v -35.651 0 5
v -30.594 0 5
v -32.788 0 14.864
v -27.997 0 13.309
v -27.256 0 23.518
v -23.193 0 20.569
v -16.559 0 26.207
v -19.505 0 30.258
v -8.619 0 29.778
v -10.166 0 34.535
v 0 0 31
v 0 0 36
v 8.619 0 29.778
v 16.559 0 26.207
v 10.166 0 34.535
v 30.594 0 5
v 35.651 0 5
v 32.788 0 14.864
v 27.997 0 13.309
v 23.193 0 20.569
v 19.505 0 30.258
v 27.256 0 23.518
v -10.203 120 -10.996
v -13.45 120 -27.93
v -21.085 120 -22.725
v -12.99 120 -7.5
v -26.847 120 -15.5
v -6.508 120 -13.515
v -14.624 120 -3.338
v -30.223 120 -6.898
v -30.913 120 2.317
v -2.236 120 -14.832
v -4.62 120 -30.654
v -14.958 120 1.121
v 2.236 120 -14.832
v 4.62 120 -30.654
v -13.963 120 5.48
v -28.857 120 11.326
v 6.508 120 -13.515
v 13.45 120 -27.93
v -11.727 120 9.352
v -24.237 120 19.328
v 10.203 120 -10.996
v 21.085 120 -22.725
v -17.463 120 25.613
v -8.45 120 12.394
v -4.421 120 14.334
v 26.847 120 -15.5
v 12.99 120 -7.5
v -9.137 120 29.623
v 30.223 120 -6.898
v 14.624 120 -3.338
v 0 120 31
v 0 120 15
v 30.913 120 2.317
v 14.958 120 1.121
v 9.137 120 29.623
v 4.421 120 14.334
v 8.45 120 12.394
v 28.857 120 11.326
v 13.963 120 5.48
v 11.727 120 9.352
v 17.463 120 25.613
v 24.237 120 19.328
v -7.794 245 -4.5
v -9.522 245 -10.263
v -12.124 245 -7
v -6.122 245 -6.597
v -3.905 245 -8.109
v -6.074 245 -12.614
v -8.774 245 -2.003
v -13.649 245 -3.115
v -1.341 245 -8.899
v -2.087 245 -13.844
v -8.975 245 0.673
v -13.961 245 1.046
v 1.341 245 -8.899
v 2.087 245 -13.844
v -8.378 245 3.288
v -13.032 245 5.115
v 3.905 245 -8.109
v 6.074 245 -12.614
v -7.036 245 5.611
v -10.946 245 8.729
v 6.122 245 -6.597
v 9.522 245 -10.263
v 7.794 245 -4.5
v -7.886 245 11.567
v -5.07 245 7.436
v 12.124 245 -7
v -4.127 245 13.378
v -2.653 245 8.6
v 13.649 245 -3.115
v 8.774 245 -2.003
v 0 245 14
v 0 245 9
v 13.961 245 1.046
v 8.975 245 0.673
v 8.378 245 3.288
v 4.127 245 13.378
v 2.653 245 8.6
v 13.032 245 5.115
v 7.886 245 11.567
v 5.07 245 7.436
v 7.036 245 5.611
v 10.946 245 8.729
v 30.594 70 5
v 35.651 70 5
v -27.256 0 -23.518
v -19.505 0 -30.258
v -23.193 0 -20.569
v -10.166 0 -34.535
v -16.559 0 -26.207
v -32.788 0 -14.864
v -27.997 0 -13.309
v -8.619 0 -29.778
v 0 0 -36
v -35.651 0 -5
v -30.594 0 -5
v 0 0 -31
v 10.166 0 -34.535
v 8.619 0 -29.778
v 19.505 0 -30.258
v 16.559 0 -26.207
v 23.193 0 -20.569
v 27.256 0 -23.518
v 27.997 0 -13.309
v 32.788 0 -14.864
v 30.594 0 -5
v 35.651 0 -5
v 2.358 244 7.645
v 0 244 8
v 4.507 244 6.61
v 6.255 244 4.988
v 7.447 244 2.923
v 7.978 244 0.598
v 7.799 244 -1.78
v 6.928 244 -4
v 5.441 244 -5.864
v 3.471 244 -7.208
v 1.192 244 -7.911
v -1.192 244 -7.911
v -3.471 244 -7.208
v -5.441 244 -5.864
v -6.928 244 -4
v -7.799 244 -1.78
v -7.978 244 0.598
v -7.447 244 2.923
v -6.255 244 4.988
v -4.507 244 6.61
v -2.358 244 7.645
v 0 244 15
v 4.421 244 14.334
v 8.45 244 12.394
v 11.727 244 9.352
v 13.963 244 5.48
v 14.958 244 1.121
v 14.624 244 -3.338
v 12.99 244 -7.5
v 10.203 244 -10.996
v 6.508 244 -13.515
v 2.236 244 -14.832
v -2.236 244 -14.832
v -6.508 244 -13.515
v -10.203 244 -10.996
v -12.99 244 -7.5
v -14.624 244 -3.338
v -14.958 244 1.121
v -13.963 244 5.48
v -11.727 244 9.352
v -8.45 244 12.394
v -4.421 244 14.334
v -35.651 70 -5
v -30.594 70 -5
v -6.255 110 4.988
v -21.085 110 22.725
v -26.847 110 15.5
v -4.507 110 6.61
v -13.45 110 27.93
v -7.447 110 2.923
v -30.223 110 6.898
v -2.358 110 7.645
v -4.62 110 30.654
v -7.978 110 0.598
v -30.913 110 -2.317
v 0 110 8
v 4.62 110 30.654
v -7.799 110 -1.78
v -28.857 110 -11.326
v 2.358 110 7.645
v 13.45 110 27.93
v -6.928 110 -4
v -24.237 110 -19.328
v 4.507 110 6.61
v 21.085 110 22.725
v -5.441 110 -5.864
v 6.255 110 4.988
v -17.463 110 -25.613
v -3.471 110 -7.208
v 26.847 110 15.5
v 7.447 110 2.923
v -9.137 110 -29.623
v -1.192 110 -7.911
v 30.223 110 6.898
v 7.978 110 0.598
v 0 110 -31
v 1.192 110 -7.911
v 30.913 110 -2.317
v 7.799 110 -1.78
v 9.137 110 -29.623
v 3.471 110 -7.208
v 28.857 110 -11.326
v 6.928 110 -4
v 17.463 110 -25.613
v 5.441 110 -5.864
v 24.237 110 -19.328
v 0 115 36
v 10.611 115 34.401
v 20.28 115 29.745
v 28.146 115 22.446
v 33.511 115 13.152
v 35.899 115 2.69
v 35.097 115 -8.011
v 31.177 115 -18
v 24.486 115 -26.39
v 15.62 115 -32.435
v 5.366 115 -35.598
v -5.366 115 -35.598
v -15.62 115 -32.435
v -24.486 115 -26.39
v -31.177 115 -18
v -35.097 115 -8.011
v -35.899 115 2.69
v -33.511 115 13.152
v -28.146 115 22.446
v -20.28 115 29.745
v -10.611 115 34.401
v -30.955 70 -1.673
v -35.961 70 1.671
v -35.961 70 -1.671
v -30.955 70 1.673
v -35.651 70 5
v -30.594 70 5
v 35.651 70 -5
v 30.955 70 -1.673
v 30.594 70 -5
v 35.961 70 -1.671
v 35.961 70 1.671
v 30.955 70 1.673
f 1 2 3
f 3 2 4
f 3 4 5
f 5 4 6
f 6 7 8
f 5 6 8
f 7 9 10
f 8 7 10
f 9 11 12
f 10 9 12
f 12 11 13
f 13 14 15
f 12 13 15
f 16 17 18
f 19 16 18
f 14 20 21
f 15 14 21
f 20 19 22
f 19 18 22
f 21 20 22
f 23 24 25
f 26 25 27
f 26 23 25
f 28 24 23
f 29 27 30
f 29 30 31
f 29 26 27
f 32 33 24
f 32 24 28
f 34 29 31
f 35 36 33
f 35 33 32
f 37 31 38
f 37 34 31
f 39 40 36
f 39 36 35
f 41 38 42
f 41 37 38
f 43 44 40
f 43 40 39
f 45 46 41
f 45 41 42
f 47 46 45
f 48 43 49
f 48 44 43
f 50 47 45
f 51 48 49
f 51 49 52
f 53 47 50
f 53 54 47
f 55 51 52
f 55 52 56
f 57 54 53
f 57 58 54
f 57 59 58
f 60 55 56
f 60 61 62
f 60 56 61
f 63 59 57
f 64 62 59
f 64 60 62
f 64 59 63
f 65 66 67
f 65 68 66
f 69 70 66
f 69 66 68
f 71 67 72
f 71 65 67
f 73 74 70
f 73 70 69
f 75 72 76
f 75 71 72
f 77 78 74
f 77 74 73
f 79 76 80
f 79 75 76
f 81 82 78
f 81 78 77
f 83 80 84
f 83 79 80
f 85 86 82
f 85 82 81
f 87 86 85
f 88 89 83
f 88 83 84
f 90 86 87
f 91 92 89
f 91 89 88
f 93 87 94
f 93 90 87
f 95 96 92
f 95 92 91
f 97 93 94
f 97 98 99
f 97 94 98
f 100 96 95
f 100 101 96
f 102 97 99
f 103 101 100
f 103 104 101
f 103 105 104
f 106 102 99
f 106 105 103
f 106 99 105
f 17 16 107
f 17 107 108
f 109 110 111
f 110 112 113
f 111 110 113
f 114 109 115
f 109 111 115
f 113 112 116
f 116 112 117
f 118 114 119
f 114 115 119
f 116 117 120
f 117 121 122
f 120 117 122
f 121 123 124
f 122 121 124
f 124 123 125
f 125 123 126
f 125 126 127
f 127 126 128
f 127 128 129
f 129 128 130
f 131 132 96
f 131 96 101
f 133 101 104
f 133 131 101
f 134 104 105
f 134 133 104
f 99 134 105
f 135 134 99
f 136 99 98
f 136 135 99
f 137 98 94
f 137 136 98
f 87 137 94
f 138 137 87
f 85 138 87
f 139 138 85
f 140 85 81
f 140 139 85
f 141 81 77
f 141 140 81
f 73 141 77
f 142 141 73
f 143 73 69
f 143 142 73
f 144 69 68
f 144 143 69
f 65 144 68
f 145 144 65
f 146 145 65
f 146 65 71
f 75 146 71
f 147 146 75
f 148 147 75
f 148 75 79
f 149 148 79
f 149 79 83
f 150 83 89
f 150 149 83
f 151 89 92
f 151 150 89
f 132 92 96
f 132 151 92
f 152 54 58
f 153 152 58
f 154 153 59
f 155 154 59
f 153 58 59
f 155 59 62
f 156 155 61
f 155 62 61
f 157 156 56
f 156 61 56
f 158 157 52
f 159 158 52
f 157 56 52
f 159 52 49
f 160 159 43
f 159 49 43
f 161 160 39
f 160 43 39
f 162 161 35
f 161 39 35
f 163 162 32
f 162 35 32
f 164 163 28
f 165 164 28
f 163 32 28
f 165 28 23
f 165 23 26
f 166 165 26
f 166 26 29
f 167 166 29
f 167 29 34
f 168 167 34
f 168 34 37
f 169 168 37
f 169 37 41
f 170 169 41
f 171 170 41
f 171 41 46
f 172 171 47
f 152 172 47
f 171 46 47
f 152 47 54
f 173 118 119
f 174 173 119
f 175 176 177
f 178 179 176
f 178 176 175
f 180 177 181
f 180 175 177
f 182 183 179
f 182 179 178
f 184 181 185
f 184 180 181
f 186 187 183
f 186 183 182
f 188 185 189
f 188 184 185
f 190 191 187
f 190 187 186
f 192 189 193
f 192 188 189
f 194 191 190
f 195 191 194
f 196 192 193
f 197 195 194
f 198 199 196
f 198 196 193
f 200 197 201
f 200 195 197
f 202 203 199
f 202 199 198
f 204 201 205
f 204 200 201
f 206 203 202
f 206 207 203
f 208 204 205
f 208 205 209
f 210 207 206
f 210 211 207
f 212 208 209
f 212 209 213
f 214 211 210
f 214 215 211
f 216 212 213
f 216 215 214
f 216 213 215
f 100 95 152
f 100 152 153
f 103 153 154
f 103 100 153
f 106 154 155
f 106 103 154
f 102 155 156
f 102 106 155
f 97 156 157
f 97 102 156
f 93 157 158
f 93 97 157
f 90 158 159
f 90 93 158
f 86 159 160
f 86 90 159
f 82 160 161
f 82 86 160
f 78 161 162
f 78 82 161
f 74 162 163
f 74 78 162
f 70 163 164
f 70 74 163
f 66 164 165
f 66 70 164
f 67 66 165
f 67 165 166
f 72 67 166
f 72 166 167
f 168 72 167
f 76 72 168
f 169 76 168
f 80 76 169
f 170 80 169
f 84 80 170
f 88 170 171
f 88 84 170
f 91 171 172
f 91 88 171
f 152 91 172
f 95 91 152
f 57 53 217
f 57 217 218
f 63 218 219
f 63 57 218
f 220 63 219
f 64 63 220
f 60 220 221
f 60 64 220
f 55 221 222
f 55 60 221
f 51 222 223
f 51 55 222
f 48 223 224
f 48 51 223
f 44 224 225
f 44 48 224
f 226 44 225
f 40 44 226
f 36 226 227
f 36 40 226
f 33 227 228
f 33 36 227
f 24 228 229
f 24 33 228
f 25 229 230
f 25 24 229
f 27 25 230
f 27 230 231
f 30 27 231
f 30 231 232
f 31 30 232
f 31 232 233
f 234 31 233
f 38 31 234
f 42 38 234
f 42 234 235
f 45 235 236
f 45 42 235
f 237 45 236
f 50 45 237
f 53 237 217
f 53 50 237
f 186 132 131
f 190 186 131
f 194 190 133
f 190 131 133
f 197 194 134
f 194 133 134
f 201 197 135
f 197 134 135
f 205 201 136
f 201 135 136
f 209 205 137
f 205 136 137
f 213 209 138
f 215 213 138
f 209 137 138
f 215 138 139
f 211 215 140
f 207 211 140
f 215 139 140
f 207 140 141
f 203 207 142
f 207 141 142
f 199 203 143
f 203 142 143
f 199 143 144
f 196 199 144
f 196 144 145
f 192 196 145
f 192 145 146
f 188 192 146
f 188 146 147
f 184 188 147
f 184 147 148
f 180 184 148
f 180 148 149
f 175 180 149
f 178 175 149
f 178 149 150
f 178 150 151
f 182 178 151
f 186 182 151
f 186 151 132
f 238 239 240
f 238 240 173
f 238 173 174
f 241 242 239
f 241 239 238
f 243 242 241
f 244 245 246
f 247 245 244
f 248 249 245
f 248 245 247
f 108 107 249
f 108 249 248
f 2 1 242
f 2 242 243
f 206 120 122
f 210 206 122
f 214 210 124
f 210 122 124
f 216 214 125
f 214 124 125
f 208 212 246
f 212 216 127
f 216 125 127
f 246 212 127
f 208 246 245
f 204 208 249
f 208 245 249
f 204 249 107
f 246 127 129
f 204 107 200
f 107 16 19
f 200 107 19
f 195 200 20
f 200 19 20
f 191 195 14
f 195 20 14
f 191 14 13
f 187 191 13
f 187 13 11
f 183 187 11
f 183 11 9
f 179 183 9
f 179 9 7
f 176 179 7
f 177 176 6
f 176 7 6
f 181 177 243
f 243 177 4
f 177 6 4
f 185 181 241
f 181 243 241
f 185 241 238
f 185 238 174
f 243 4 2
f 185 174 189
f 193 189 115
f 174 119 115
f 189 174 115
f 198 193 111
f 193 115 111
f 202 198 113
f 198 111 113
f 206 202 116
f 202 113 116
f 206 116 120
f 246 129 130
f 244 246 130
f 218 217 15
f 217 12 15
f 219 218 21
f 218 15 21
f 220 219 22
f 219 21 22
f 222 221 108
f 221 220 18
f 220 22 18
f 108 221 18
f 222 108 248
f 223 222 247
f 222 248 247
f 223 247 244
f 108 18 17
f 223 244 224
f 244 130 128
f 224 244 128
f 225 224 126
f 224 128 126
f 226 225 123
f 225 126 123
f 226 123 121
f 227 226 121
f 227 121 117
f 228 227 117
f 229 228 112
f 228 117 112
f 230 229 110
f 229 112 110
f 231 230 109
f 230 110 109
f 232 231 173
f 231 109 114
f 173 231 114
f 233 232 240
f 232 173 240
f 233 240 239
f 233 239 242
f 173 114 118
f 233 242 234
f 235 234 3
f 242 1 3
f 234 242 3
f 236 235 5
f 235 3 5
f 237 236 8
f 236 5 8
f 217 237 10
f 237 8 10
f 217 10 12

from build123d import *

# Parameters (mm, degrees)
SCHIZZO1_R        = 36
ESTRUSIONE1_DEPTH = 120
SCHIZZO2_R        = 31
ESTRUSIONE2_DEPTH = 110
SMUSSO1_SIZE      = 5
SCHIZZO3_R        = 15
ESTRUSIONE3_DEPTH = 125
SCHIZZO4_R        = 8
ESTRUSIONE4_DEPTH = 251.23389059
SMUSSO2_SIZE      = 1
SCHIZZO5_W        = 88.337421072
SCHIZZO5_H        = 10
ESTRUSIONE5_DEPTH = 70


with BuildPart() as part:
    # Schizzo1 → Estrusione1 (new body)
    with BuildSketch(Plane(origin=(0, 0, 0), x_dir=(1, 0, 0), z_dir=(0, 1, 0))):
        with Locations(Location((0, 0, 0), (0, 0, 270))):
            Circle(SCHIZZO1_R)
    extrude(amount=ESTRUSIONE1_DEPTH)

    # Schizzo2 → Estrusione2 (cut)
    with BuildSketch(Plane.XZ):
        with Locations(Location((0, 0, 0), (0, 0, 270))):
            Circle(SCHIZZO2_R)
    extrude(amount=-ESTRUSIONE2_DEPTH, mode=Mode.SUBTRACT)

    # Smusso1
    smusso1_edges = [part.edges().sort_by_distance(p)[0] for p in [
        (0, 120, -36),
    ]]
    chamfer(smusso1_edges, length=SMUSSO1_SIZE)

    # Schizzo3 → Estrusione3 (add)
    with BuildSketch(Plane(origin=(0, 120, 0), x_dir=(1, 0, 0), z_dir=(0, 1, 0))):
        with Locations(Location((0, 0, 0), (0, 0, 270))):
            Circle(SCHIZZO3_R)
    extrude(amount=ESTRUSIONE3_DEPTH)

    # Schizzo4 → Estrusione4 (cut, through all)
    with BuildSketch(Plane(origin=(0, 245, 0), x_dir=(1, 0, 0), z_dir=(0, 1, 0))):
        with Locations(Location((0, 0, 0), (0, 0, 270))):
            Circle(SCHIZZO4_R)
    extrude(amount=-ESTRUSIONE4_DEPTH, mode=Mode.SUBTRACT)

    # Smusso2
    smusso2_edges = [part.edges().sort_by_distance(p)[0] for p in [
        (0, 245, -15),
        (0, 245, -8),
    ]]
    chamfer(smusso2_edges, length=SMUSSO2_SIZE)

    # Schizzo5 → Estrusione5 (cut)
    with BuildSketch(Plane.XZ):
        Rectangle(SCHIZZO5_W, SCHIZZO5_H)
    extrude(amount=-ESTRUSIONE5_DEPTH, mode=Mode.SUBTRACT)


solid = part.part
